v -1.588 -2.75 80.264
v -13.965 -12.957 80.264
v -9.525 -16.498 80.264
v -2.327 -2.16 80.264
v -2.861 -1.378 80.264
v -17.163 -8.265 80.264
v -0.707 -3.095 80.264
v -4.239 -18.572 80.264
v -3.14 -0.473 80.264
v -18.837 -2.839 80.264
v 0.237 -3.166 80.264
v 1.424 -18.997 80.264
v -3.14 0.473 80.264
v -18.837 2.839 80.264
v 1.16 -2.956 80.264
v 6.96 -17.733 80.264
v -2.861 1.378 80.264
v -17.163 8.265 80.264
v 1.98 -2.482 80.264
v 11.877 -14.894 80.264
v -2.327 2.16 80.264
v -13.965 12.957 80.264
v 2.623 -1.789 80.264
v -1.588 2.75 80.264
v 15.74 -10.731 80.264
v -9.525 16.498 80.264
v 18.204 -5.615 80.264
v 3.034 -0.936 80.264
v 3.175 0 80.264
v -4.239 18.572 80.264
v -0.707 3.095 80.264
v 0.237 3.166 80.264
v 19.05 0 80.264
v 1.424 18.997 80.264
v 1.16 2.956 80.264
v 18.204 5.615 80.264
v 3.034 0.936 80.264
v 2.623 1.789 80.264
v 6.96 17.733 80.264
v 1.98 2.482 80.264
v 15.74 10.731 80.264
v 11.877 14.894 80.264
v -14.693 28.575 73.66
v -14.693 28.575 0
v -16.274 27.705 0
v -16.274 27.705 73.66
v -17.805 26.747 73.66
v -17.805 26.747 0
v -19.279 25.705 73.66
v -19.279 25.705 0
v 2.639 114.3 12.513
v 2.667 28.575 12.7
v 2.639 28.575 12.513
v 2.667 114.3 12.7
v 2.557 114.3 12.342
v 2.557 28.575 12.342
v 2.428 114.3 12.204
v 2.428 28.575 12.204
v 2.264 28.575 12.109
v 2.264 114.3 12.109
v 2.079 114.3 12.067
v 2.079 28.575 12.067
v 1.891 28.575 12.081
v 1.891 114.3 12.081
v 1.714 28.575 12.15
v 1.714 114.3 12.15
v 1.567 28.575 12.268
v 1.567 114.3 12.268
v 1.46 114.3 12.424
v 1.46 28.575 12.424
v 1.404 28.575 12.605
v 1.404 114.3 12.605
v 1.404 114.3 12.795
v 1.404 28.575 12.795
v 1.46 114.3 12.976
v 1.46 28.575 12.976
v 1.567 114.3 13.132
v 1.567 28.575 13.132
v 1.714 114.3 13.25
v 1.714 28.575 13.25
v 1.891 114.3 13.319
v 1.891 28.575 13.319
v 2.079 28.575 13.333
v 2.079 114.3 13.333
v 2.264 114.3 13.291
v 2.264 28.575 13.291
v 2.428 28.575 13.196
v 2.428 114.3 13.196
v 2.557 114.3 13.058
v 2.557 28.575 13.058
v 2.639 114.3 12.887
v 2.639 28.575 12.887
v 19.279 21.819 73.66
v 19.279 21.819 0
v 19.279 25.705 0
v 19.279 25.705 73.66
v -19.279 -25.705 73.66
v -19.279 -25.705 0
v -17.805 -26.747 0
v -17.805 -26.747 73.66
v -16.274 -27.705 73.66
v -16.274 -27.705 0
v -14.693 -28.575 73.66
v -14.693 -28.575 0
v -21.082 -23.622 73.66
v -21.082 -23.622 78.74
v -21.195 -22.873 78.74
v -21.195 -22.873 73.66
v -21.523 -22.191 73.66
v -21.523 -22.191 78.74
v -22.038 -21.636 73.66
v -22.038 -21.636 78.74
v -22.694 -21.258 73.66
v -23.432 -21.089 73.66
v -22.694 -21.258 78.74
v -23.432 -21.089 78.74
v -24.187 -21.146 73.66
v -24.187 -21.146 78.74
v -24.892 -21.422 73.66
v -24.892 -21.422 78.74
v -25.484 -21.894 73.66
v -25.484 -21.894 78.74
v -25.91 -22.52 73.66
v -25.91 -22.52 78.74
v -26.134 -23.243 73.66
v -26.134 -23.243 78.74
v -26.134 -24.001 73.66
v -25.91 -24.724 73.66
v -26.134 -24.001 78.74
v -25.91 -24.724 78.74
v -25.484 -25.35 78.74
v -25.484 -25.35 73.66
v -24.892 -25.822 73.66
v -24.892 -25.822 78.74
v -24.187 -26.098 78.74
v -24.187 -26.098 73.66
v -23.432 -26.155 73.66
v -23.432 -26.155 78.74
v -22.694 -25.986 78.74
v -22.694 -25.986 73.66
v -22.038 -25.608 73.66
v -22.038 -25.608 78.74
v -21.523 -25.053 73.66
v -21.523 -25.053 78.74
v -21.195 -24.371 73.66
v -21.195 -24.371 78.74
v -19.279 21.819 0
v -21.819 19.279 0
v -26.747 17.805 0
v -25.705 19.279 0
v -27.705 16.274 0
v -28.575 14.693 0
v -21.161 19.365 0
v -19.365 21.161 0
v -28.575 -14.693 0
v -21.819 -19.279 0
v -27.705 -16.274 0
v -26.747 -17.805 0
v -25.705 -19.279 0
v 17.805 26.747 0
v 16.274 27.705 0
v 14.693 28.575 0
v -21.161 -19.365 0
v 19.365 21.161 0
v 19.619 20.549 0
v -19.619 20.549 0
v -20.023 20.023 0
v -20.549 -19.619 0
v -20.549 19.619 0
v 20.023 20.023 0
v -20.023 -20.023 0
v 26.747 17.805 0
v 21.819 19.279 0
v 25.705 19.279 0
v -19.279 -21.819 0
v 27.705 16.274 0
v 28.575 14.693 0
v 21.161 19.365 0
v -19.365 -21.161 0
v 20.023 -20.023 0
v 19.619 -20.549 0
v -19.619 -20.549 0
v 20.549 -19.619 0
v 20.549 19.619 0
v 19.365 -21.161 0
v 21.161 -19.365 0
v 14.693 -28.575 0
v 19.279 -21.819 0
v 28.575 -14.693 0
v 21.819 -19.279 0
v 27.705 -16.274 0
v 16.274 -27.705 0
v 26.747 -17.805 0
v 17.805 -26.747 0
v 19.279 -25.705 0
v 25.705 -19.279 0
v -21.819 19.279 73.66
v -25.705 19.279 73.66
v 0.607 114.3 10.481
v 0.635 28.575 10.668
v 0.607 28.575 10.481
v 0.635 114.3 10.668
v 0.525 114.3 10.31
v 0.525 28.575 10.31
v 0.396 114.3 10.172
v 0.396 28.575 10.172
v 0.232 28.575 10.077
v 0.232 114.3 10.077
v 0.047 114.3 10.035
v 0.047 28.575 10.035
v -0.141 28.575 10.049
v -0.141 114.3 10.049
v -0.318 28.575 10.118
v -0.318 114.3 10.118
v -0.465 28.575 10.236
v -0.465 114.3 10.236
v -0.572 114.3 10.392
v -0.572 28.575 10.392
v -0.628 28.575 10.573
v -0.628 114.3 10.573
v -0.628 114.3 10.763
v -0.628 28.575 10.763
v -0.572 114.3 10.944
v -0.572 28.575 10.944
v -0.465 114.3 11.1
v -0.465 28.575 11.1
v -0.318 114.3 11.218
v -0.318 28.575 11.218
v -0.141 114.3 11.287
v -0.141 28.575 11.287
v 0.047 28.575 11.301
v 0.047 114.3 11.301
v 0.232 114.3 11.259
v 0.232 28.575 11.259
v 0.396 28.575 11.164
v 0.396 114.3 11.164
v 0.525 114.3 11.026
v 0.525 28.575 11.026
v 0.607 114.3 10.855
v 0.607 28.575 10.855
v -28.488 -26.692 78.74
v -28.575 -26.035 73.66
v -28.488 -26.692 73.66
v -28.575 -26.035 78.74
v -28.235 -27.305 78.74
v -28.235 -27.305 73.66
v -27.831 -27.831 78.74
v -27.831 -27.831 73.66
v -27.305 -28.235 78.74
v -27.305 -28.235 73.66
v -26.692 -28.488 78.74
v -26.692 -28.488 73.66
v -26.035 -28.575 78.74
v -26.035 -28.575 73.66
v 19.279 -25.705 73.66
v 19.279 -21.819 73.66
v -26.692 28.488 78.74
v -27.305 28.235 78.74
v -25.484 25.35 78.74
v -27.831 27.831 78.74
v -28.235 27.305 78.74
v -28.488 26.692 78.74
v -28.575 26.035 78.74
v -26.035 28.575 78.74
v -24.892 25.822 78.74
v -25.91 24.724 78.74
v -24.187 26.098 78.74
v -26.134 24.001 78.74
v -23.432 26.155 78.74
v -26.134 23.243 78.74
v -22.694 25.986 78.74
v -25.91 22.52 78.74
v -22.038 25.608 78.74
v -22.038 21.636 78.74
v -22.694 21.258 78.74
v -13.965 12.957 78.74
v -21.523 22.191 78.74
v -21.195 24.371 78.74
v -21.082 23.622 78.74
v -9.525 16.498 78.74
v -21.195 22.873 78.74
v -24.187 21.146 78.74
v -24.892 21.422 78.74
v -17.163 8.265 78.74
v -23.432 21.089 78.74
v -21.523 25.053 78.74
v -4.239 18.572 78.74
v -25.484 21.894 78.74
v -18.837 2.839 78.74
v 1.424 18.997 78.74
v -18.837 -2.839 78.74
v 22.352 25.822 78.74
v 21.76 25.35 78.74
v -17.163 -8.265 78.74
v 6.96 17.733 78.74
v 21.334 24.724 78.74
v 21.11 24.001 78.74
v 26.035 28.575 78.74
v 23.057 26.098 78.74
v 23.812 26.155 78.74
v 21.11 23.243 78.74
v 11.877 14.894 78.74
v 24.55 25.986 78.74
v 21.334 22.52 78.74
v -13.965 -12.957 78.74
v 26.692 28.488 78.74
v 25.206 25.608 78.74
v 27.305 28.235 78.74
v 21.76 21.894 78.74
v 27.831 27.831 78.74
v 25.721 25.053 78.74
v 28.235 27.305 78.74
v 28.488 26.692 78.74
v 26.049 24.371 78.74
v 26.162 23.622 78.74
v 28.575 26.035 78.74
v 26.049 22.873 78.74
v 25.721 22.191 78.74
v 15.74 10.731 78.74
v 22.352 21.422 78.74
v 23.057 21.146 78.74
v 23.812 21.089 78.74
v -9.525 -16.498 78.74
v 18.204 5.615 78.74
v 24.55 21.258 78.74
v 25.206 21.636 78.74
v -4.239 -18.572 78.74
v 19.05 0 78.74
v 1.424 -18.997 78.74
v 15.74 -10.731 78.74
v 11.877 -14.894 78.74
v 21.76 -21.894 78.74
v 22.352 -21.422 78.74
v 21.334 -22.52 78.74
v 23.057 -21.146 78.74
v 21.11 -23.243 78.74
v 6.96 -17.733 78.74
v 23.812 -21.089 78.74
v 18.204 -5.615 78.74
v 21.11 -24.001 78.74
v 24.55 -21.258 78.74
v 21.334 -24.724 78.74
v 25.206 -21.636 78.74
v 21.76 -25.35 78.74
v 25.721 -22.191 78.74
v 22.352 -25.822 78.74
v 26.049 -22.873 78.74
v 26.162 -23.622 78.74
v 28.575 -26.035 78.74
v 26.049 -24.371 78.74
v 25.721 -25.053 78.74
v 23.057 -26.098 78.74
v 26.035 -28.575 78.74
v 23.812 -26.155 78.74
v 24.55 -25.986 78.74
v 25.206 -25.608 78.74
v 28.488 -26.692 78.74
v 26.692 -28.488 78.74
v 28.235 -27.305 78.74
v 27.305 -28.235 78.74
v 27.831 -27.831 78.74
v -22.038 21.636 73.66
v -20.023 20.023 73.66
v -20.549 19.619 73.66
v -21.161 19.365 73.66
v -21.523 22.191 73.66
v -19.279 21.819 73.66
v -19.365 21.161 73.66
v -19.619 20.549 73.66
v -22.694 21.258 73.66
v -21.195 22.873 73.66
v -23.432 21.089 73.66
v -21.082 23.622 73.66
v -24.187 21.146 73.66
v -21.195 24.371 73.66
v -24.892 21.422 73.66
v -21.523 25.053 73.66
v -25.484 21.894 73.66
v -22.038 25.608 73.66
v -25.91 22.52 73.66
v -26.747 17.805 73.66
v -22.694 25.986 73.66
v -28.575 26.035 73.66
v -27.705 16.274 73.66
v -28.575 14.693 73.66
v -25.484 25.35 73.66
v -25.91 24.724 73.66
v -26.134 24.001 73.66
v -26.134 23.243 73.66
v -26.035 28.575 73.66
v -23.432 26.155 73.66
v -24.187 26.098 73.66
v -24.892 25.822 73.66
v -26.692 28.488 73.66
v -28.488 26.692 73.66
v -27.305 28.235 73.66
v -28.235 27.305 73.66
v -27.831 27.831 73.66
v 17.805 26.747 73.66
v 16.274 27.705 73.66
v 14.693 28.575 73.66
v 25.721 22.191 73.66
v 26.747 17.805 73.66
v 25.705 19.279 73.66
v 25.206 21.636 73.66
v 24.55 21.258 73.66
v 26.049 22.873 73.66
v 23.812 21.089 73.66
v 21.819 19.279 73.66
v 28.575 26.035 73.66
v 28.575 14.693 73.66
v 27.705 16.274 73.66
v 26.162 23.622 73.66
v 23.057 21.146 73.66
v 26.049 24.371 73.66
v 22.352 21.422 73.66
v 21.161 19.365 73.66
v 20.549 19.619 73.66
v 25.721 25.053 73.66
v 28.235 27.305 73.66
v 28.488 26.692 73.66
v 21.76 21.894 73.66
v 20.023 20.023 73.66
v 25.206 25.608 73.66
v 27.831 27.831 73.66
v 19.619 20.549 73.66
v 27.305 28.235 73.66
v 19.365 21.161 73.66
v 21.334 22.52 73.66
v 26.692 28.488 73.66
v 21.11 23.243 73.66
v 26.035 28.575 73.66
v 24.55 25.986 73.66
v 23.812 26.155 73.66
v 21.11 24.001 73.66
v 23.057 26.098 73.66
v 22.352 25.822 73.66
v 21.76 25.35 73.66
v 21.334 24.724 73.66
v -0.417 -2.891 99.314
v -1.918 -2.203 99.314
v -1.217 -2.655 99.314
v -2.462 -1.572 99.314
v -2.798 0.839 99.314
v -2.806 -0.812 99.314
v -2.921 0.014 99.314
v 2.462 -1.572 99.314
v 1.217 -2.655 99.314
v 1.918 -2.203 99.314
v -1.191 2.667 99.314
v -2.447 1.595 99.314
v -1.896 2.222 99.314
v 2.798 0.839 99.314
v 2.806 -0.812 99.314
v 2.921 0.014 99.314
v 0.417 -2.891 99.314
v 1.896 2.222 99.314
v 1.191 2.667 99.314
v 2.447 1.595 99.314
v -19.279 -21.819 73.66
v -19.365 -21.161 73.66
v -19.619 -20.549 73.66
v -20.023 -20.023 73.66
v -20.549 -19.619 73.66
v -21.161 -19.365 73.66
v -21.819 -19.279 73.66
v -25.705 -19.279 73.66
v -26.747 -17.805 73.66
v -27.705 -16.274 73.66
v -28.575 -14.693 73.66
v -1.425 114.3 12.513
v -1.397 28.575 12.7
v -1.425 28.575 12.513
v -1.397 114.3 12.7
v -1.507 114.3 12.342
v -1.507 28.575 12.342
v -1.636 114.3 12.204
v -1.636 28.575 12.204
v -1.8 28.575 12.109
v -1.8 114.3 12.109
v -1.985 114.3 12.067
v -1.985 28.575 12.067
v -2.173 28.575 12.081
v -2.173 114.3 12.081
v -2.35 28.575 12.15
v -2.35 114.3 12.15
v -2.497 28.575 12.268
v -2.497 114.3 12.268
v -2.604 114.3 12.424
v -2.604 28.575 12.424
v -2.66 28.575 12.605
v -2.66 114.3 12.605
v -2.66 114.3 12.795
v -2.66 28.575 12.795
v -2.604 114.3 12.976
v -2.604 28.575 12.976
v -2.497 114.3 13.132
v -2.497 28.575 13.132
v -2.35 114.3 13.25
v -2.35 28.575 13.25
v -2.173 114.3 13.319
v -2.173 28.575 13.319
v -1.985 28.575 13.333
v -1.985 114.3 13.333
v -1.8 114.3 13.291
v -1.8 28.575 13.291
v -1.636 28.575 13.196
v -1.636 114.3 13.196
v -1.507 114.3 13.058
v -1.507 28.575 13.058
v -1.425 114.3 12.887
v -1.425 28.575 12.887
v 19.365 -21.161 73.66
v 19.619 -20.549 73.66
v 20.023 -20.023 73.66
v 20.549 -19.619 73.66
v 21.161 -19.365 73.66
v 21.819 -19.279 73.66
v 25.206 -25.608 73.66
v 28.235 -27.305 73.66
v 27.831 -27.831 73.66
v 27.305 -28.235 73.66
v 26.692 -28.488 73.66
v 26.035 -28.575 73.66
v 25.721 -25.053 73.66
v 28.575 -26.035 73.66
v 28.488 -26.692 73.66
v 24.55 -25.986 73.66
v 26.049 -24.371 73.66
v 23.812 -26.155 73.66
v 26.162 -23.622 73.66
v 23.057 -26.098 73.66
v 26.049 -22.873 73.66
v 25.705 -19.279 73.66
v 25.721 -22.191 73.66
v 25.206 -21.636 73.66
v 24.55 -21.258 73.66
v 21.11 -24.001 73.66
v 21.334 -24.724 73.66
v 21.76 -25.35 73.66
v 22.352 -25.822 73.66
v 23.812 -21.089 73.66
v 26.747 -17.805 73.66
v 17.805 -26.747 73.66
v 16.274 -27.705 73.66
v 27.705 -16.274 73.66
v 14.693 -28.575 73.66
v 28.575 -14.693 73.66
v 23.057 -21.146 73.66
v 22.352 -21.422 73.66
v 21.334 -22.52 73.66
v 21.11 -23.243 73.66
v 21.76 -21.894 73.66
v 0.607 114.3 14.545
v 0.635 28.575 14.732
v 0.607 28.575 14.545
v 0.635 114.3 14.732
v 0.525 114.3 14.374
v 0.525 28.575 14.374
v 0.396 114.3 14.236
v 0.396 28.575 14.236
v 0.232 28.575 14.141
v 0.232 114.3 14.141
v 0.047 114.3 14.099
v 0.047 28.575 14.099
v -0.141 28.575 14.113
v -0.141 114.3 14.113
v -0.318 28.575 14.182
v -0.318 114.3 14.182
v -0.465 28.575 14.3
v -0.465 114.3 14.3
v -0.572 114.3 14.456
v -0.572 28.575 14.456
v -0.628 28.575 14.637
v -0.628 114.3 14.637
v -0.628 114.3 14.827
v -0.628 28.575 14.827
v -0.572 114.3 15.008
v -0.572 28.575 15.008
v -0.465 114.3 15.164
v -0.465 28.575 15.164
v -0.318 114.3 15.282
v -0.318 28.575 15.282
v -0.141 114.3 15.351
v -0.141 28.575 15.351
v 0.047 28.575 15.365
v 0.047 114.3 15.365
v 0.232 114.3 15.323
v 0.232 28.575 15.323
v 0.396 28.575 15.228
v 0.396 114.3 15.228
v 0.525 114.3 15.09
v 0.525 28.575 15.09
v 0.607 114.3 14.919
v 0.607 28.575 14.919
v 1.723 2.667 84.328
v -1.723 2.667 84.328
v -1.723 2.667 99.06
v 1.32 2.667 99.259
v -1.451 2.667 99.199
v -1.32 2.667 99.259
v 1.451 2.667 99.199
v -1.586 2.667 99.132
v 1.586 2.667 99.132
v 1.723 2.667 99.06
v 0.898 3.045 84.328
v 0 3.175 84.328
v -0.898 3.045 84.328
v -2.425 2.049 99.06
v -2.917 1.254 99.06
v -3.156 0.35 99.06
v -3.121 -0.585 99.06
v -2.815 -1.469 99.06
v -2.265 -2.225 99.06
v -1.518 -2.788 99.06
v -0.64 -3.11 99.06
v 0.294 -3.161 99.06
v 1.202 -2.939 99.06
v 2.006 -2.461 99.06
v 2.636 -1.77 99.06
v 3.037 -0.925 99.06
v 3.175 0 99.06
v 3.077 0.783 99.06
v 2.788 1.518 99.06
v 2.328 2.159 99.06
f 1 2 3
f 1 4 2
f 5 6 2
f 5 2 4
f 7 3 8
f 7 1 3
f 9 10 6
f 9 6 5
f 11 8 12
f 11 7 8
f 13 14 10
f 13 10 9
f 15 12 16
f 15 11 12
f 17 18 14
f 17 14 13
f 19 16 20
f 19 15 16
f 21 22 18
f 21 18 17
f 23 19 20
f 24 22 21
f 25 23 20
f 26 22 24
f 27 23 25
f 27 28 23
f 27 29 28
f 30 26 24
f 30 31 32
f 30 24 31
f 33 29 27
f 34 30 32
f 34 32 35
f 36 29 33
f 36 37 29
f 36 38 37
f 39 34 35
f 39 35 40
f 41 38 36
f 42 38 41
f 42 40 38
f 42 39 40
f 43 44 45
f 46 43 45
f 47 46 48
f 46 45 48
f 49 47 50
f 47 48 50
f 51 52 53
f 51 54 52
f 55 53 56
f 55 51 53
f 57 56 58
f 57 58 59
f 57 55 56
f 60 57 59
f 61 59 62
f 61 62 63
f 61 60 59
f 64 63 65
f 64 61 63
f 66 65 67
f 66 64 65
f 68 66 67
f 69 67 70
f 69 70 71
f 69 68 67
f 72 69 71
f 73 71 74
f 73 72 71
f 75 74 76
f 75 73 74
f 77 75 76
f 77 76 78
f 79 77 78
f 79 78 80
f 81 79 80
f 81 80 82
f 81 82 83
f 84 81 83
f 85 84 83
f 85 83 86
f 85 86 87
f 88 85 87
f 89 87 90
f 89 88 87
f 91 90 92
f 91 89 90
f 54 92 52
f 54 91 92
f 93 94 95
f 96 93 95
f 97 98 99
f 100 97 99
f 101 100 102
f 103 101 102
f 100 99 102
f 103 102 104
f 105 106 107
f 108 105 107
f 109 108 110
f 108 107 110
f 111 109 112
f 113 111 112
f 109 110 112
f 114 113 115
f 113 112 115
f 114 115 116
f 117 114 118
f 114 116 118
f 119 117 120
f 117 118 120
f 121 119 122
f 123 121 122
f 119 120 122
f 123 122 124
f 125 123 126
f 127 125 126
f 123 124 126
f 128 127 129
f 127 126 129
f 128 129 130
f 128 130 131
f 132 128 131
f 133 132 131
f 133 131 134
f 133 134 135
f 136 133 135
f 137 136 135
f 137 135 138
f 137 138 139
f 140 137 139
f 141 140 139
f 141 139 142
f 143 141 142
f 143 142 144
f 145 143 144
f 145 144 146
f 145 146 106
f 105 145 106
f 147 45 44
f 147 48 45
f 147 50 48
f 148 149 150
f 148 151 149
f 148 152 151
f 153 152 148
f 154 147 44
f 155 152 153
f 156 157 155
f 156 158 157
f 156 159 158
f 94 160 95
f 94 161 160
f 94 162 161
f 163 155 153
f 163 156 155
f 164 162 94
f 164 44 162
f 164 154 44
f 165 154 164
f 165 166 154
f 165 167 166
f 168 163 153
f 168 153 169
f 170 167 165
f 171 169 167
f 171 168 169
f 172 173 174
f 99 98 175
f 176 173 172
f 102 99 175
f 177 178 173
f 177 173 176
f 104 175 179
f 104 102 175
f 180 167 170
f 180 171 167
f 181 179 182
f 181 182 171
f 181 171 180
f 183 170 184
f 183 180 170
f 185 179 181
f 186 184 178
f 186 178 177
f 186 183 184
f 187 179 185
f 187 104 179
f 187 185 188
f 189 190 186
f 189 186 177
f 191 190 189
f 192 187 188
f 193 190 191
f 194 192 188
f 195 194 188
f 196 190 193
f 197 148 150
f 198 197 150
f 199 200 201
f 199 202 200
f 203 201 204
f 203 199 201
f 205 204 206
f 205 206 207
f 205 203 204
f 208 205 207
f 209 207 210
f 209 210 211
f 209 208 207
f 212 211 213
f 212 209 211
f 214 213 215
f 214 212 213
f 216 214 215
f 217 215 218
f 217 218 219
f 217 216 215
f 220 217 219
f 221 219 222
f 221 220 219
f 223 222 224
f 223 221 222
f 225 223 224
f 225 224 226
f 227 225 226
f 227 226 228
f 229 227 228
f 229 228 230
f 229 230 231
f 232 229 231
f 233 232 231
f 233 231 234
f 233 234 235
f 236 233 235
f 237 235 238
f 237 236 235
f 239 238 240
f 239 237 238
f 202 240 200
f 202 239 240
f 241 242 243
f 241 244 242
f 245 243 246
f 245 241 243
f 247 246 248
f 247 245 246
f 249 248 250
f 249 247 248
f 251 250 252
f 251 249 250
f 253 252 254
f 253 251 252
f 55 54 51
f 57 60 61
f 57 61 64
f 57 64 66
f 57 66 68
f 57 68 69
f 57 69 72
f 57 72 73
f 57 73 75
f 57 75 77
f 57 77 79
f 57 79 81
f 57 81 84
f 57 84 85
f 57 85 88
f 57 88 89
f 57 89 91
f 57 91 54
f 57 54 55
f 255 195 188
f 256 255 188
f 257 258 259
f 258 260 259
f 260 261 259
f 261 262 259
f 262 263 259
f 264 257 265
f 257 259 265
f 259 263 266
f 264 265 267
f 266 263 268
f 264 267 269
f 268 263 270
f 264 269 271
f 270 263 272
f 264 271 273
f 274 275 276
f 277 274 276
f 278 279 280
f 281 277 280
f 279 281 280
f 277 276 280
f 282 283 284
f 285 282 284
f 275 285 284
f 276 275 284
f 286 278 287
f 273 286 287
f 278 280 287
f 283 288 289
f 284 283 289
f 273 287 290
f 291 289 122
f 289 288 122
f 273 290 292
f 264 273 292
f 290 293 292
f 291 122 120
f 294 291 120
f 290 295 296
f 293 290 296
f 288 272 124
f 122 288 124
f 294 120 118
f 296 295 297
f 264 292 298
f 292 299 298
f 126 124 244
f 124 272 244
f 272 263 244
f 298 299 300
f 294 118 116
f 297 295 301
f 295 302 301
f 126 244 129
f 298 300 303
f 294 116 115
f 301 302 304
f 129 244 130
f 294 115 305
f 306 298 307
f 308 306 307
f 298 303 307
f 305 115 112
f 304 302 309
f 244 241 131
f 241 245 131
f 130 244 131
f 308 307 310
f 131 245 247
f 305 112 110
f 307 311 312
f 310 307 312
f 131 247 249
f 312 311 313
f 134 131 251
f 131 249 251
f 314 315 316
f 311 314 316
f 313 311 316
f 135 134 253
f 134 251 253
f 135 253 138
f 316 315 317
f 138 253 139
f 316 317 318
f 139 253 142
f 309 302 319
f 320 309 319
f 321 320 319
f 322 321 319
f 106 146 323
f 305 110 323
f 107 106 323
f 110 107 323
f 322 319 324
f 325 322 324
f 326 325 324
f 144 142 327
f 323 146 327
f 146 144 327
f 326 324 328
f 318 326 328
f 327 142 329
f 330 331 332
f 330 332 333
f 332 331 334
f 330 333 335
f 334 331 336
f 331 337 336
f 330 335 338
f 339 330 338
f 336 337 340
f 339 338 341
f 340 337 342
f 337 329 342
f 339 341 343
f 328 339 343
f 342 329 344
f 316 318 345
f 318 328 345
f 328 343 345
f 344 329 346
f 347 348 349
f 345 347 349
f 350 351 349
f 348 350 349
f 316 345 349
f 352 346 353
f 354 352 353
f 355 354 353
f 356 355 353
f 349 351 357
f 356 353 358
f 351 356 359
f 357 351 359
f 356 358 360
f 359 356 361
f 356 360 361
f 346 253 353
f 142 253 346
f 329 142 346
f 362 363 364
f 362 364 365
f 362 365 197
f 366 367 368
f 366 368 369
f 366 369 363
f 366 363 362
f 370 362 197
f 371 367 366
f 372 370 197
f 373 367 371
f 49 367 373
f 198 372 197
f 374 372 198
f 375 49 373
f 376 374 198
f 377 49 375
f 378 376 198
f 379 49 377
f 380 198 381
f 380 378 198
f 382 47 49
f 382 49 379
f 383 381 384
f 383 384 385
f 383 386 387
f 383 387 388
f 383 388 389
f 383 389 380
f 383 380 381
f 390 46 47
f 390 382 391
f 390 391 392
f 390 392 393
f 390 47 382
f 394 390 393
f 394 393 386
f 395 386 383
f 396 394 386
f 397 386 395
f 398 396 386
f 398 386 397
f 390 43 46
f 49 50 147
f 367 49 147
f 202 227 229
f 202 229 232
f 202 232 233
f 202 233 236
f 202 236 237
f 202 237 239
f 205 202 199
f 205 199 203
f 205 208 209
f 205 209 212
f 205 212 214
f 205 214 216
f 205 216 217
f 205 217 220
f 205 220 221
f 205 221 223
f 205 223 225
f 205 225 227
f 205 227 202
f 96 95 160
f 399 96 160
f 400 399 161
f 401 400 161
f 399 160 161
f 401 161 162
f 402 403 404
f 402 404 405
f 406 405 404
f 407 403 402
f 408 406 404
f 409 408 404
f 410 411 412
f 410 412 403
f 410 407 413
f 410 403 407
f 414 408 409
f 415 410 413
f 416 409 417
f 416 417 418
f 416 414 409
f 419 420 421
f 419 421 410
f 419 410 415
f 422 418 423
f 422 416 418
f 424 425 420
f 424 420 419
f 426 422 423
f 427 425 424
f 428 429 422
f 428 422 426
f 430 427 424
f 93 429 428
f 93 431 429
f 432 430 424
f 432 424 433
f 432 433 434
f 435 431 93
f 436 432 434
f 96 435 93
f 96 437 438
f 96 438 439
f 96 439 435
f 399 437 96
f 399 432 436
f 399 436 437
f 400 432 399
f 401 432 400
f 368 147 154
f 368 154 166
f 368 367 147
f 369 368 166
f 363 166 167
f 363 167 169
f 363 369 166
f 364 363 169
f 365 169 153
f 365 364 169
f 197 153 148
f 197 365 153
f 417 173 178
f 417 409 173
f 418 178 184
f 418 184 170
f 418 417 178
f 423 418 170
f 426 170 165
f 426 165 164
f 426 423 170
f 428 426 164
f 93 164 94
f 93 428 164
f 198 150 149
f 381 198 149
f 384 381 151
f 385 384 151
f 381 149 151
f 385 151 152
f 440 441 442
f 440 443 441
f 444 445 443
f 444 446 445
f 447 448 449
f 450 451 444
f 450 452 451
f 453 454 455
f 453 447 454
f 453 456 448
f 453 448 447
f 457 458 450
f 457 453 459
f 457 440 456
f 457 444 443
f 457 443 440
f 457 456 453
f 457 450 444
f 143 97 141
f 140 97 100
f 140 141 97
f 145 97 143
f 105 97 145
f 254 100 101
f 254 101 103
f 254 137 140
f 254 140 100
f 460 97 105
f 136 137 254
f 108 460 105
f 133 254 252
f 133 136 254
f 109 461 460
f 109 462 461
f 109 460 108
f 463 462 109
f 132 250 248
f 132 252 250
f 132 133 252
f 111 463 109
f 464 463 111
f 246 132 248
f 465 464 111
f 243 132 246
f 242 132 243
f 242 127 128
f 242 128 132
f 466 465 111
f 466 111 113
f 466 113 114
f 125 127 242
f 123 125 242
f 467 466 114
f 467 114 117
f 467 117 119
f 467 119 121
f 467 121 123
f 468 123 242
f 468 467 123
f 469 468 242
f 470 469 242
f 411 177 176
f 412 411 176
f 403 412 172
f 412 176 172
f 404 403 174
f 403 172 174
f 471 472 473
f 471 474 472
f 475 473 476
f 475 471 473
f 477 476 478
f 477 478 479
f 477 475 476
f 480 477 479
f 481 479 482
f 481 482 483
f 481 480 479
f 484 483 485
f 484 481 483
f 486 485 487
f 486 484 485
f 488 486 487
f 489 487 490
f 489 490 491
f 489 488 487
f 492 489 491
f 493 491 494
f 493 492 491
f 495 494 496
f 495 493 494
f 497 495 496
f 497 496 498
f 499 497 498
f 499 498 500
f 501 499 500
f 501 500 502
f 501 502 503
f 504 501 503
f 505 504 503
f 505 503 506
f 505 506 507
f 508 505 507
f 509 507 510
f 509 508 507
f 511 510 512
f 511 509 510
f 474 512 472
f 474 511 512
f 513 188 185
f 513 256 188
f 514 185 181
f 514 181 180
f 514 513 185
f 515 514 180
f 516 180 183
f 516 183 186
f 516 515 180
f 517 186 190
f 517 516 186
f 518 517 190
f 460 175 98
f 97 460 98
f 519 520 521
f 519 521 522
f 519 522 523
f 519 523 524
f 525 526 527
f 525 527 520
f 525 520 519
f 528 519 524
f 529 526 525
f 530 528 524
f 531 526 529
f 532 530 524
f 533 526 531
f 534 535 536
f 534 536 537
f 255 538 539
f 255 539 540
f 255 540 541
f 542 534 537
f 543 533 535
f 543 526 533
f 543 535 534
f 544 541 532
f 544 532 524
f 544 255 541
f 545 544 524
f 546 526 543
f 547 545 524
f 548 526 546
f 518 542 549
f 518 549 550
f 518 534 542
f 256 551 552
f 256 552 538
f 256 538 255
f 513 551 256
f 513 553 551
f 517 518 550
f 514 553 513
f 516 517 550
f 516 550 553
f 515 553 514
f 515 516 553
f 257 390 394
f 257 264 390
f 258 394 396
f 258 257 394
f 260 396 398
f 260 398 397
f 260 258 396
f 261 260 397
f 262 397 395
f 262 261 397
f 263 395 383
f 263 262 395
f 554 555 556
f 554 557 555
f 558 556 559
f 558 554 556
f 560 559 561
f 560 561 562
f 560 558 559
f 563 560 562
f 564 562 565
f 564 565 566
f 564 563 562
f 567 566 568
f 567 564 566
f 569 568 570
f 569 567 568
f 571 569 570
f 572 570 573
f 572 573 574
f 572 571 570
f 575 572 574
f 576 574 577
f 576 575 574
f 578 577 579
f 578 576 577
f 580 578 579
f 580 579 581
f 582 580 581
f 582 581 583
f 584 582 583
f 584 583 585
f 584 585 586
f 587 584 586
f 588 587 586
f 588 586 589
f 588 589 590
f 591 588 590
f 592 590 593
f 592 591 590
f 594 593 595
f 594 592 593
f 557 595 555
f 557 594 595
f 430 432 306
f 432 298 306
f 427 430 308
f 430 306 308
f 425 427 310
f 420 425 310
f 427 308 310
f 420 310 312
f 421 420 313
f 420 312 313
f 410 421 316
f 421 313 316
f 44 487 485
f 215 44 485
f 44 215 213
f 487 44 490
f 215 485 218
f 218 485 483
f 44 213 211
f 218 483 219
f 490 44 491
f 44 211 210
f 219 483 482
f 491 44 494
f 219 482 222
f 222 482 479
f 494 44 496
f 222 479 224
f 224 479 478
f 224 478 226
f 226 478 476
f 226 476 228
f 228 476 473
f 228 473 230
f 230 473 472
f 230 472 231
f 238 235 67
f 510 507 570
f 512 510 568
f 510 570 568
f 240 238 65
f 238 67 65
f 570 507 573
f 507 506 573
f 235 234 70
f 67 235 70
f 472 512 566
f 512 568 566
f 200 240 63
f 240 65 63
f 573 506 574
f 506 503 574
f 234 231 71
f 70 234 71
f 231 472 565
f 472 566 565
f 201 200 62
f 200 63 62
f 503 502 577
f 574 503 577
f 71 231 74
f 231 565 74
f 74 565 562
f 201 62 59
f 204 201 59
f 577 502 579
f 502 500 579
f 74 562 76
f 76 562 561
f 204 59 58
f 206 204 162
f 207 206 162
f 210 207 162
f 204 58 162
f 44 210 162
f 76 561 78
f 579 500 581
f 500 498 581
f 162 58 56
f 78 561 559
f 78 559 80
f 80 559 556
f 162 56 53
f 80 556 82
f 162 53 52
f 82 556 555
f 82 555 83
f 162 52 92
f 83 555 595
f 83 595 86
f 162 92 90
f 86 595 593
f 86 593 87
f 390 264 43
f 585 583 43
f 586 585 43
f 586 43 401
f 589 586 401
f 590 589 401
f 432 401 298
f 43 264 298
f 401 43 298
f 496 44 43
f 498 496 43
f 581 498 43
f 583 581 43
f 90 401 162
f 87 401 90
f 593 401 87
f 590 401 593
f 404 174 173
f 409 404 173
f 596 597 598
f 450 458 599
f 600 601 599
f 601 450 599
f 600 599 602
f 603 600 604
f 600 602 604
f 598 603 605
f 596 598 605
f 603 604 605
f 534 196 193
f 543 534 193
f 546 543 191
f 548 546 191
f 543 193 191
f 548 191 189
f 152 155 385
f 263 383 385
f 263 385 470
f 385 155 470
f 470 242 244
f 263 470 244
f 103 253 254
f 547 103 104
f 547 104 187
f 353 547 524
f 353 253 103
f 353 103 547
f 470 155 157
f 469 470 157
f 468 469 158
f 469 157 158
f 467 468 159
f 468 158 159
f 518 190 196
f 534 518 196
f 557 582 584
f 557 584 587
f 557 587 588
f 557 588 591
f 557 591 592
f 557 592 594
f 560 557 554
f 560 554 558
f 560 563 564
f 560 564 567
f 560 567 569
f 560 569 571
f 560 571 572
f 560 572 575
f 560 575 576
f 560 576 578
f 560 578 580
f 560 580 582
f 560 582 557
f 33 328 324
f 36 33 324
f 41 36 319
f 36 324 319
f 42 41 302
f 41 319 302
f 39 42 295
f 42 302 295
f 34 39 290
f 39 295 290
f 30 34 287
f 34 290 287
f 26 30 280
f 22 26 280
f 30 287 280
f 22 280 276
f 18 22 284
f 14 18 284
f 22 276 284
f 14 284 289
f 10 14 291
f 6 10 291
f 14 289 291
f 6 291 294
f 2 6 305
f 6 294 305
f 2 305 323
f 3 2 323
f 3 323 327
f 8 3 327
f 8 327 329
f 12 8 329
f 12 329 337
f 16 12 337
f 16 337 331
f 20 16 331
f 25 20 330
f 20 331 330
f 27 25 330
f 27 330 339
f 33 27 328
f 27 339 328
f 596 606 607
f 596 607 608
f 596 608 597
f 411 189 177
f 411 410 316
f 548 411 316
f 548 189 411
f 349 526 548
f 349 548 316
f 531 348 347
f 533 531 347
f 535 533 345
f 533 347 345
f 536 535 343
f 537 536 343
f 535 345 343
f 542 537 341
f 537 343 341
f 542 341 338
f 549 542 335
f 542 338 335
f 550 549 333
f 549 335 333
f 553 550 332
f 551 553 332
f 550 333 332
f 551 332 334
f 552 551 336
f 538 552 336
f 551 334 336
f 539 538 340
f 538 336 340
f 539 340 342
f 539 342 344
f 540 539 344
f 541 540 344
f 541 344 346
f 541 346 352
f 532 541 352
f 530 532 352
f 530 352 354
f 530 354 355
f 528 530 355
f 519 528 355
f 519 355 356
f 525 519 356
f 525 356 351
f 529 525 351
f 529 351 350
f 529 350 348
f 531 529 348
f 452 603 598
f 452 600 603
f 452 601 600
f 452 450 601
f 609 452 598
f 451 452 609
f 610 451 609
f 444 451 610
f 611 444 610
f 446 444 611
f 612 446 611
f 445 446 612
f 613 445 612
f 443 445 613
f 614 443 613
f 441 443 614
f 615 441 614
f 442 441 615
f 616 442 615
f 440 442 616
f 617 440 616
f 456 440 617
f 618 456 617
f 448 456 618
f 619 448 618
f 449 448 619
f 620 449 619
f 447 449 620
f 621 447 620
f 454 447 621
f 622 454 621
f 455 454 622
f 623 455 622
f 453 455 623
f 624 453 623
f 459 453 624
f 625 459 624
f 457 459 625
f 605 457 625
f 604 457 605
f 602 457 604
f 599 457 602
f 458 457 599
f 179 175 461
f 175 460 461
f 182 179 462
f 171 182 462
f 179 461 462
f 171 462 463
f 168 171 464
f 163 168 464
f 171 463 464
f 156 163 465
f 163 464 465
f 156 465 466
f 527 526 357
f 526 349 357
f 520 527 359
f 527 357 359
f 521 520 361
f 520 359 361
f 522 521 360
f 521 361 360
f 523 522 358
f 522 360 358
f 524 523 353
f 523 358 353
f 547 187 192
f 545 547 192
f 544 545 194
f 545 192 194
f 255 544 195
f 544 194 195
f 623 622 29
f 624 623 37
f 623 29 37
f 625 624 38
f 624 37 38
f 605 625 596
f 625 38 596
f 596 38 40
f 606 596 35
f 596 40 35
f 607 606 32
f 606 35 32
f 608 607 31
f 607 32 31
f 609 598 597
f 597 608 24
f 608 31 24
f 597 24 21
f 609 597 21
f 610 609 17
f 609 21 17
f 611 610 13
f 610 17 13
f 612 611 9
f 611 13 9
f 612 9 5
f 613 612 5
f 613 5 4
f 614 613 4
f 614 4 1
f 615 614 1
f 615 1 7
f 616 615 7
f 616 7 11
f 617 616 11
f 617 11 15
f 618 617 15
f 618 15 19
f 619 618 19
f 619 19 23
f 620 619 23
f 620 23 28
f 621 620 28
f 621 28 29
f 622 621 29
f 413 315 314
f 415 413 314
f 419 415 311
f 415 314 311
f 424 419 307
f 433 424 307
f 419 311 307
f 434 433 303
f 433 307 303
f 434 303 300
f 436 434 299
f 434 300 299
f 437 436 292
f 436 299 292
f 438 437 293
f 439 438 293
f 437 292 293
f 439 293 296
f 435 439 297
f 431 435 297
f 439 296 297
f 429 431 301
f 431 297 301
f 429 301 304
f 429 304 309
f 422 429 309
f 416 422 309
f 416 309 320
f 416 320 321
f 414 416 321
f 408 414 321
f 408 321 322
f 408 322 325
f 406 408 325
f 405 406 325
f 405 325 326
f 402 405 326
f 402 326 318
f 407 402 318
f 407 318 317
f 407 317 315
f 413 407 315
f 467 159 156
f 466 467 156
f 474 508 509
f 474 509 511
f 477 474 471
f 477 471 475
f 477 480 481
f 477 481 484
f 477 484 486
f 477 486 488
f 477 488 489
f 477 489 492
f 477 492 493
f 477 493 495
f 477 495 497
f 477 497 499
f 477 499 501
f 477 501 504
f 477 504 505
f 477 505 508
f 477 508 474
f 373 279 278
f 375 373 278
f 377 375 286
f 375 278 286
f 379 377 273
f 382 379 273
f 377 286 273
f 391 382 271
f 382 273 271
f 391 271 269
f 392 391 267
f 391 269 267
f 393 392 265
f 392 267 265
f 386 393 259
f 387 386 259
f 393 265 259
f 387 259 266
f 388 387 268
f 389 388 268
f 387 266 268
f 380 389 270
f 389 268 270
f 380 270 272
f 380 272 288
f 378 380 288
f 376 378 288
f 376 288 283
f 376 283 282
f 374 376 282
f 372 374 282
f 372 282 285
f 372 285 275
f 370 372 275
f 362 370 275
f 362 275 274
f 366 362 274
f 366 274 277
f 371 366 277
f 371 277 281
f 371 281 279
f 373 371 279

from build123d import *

# Parameters (mm, degrees)
SKETCH1_W           = 57.15
SKETCH1_H           = 78.74
BOSS_EXTRUDE1_DEPTH = 57.15
CUT_EXTRUDE1_DEPTH  = 73.66
CUT_EXTRUDE2_DEPTH  = 73.66
CUT_EXTRUDE3_DEPTH  = 73.66
CUT_EXTRUDE4_DEPTH  = 73.66
CUT_EXTRUDE5_DEPTH  = 73.66
CUT_EXTRUDE6_DEPTH  = 73.66
CUT_EXTRUDE7_DEPTH  = 73.66
CUT_EXTRUDE8_DEPTH  = 73.66
SKETCH10_R          = 19.05
BOSS_EXTRUDE2_DEPTH = 1.524
SKETCH11_R          = 3.175
BOSS_EXTRUDE3_DEPTH = 19.05
CUT_EXTRUDE9_DEPTH  = 14.986
SKETCH13_W          = 0.635
SKETCH13_H          = 85.725
SKETCH14_W          = 0.635
SKETCH14_H          = 85.725
SKETCH15_W          = 0.635
SKETCH15_H          = 85.725
SKETCH16_W          = 0.635
SKETCH16_H          = 85.725
HOLE1_D             = 5.08
HOLE1_DEPTH         = 25.654
HOLE2_D             = 5.08
HOLE2_DEPTH         = 25.654
HOLE3_D             = 5.08
HOLE3_DEPTH         = 25.654
HOLE4_D             = 5.08
HOLE4_DEPTH         = 25.654
CHAMFER1_SIZE       = 0.254
FILLET1_R           = 2.54
FILLET2_R           = 2.54
FILLET3_R           = 2.54
FILLET4_R           = 2.54
FILLET5_R           = 2.54
FILLET6_R           = 2.54
FILLET7_R           = 2.54
FILLET8_R           = 2.54


with BuildPart() as part:
    # Sketch1 → Boss-Extrude1 (new body)
    with BuildSketch(Plane.XZ.offset(28.575)):
        with Locations((0, 39.37)):
            Rectangle(SKETCH1_W, SKETCH1_H)
    extrude(amount=-BOSS_EXTRUDE1_DEPTH)

    # Sketch2 → Cut-Extrude1 (cut)
    with BuildSketch(Plane(origin=(0, 0, 0), x_dir=(-1, 0, 0), z_dir=(0, 0, -1))):
        with BuildLine():
            Line((-28.575, -28.575), (-14.692533342, -28.575))
            ThreePointArc((-14.692533342, -28.575), (-22.720047986, -22.720047986), (-28.575, -14.692533342))
            Line((-28.575, -14.692533342), (-28.575, -28.575))
        make_face()
    extrude(amount=-CUT_EXTRUDE1_DEPTH, mode=Mode.SUBTRACT)

    # Sketch3 → Cut-Extrude2 (cut)
    with BuildSketch(Plane(origin=(0, 0, 0), x_dir=(-1, 0, 0), z_dir=(0, 0, -1))):
        with BuildLine():
            Line((-19.2786, -25.7048), (-19.2786, -19.2786))
            Line((-19.2786, -19.2786), (-25.7048, -19.2786))
            ThreePointArc((-25.7048, -19.2786), (-22.720047986, -22.720047986), (-19.2786, -25.7048))
        make_face()
    extrude(amount=-CUT_EXTRUDE2_DEPTH, mode=Mode.SUBTRACT)

    # Sketch4 → Cut-Extrude3 (cut)
    with BuildSketch(Plane(origin=(0, 0, 0), x_dir=(-1, 0, 0), z_dir=(0, 0, -1))):
        with BuildLine():
            Line((-28.575, 28.575), (-28.575, 14.692533342))
            ThreePointArc((-28.575, 14.692533342), (-22.720047986, 22.720047986), (-14.692533342, 28.575))
            Line((-14.692533342, 28.575), (-28.575, 28.575))
        make_face()
    extrude(amount=-CUT_EXTRUDE3_DEPTH, mode=Mode.SUBTRACT)

    # Sketch5 → Cut-Extrude4 (cut)
    with BuildSketch(Plane(origin=(0, 0, 0), x_dir=(-1, 0, 0), z_dir=(0, 0, -1))):
        with BuildLine():
            Line((-25.7048, 19.2786), (-19.2786, 19.2786))
            Line((-19.2786, 19.2786), (-19.2786, 25.7048))
            ThreePointArc((-19.2786, 25.7048), (-22.720047986, 22.720047986), (-25.7048, 19.2786))
        make_face()
    extrude(amount=-CUT_EXTRUDE4_DEPTH, mode=Mode.SUBTRACT)

    # Sketch6 → Cut-Extrude5 (cut)
    with BuildSketch(Plane(origin=(0, 0, 0), x_dir=(-1, 0, 0), z_dir=(0, 0, -1))):
        with BuildLine():
            Line((28.575, 28.575), (14.692533342, 28.575))
            ThreePointArc((14.692533342, 28.575), (22.720047986, 22.720047986), (28.575, 14.692533342))
            Line((28.575, 14.692533342), (28.575, 28.575))
        make_face()
    extrude(amount=-CUT_EXTRUDE5_DEPTH, mode=Mode.SUBTRACT)

    # Sketch7 → Cut-Extrude6 (cut)
    with BuildSketch(Plane(origin=(0, 0, 0), x_dir=(-1, 0, 0), z_dir=(0, 0, -1))):
        with BuildLine():
            Line((19.2786, 25.7048), (19.2786, 19.2786))
            Line((19.2786, 19.2786), (25.7048, 19.2786))
            ThreePointArc((25.7048, 19.2786), (22.720047986, 22.720047986), (19.2786, 25.7048))
        make_face()
    extrude(amount=-CUT_EXTRUDE6_DEPTH, mode=Mode.SUBTRACT)

    # Sketch8 → Cut-Extrude7 (cut)
    with BuildSketch(Plane(origin=(0, 0, 0), x_dir=(-1, 0, 0), z_dir=(0, 0, -1))):
        with BuildLine():
            Line((28.575, -28.575), (28.575, -14.692533342))
            ThreePointArc((28.575, -14.692533342), (22.720047986, -22.720047986), (14.692533342, -28.575))
            Line((14.692533342, -28.575), (28.575, -28.575))
        make_face()
    extrude(amount=-CUT_EXTRUDE7_DEPTH, mode=Mode.SUBTRACT)

    # Sketch9 → Cut-Extrude8 (cut)
    with BuildSketch(Plane(origin=(0, 0, 0), x_dir=(-1, 0, 0), z_dir=(0, 0, -1))):
        with BuildLine():
            Line((25.7048, -19.2786), (19.2786, -19.2786))
            Line((19.2786, -19.2786), (19.2786, -25.7048))
            ThreePointArc((19.2786, -25.7048), (22.720047986, -22.720047986), (25.7048, -19.2786))
        make_face()
    extrude(amount=-CUT_EXTRUDE8_DEPTH, mode=Mode.SUBTRACT)

    # Sketch10 → Boss-Extrude2 (add)
    with BuildSketch(Plane.XY.offset(78.74)):
        Circle(SKETCH10_R)
    extrude(amount=BOSS_EXTRUDE2_DEPTH)

    # Sketch11 → Boss-Extrude3 (add)
    with BuildSketch(Plane.XY.offset(80.264)):
        Circle(SKETCH11_R)
    extrude(amount=BOSS_EXTRUDE3_DEPTH)

    # Sketch12 → Cut-Extrude9 (cut)
    with BuildSketch(Plane.XY.offset(99.314)):
        with BuildLine():
            Line((-1.722711816, 2.667), (1.722711816, 2.667))
            ThreePointArc((1.722711816, 2.667), (0, 3.175), (-1.722711816, 2.667))
        make_face()
    extrude(amount=-CUT_EXTRUDE9_DEPTH, mode=Mode.SUBTRACT)

    # Sketch13 → Revolve1 (revolve)
    with BuildSketch(Plane(origin=(0, 0, 12.7), x_dir=(-1, 0, 0), z_dir=(0, 0, -1))):
        with Locations((1.7145, 71.4375)):
            Rectangle(SKETCH13_W, SKETCH13_H)
    revolve(axis=Axis((-2.032, 28.575, 12.7), (0, 1, 0)))

    # Sketch14 → Revolve2 (revolve)
    with BuildSketch(Plane(origin=(0, 0, 12.7), x_dir=(-1, 0, 0), z_dir=(0, 0, -1))):
        with Locations((-2.3495, 71.4375)):
            Rectangle(SKETCH14_W, SKETCH14_H)
    revolve(axis=Axis((2.032, 28.575, 12.7), (0, 1, 0)))

    # Sketch15 → Revolve3 (revolve)
    with BuildSketch(Plane(origin=(0, 0, 14.732), x_dir=(-1, 0, 0), z_dir=(0, 0, -1))):
        with Locations((-0.3175, 71.4375)):
            Rectangle(SKETCH15_W, SKETCH15_H)
    revolve(axis=Axis((0, 28.575, 14.732), (0, 1, 0)))

    # Sketch16 → Revolve4 (revolve)
    with BuildSketch(Plane(origin=(0, 0, 10.668), x_dir=(-1, 0, 0), z_dir=(0, 0, -1))):
        with Locations((-0.3175, 71.4375)):
            Rectangle(SKETCH16_W, SKETCH16_H)
    revolve(axis=Axis((0, 28.575, 10.668), (0, 1, 0)))

    # Hole1
    with Locations(Plane(origin=(0, 0, 73.66), x_dir=(-1, 0, 0), z_dir=(0, 0, -1))):
        with Locations((23.622, -23.622)):
            Hole(HOLE1_D / 2, depth=HOLE1_DEPTH)

    # Hole2
    with Locations(Plane(origin=(0, 0, 73.66), x_dir=(-1, 0, 0), z_dir=(0, 0, -1))):
        with Locations((23.622, 23.622)):
            Hole(HOLE2_D / 2, depth=HOLE2_DEPTH)

    # Hole3
    with Locations(Plane(origin=(0, 0, 73.66), x_dir=(-1, 0, 0), z_dir=(0, 0, -1))):
        with Locations((-23.622, 23.622)):
            Hole(HOLE3_D / 2, depth=HOLE3_DEPTH)

    # Hole4
    with Locations(Plane(origin=(0, 0, 73.66), x_dir=(-1, 0, 0), z_dir=(0, 0, -1))):
        with Locations((-23.622, -23.622)):
            Hole(HOLE4_D / 2, depth=HOLE4_DEPTH)

    # Chamfer1
    chamfer1_edges = [part.edges().sort_by_distance(p)[0] for p in [
        (-1.51838977, -2.78838977, 99.314),
    ]]
    chamfer(chamfer1_edges, length=CHAMFER1_SIZE)

    # Fillet1
    fillet1_edges = [part.edges().sort_by_distance(p)[0] for p in [
        (-28.575, 28.575, 76.2),
    ]]
    fillet(fillet1_edges, radius=FILLET1_R)

    # Fillet2
    fillet2_edges = [part.edges().sort_by_distance(p)[0] for p in [
        (-28.575, -28.575, 76.2),
    ]]
    fillet(fillet2_edges, radius=FILLET2_R)

    # Fillet3
    fillet3_edges = [part.edges().sort_by_distance(p)[0] for p in [
        (28.575, 28.575, 76.2),
    ]]
    fillet(fillet3_edges, radius=FILLET3_R)

    # Fillet4
    fillet4_edges = [part.edges().sort_by_distance(p)[0] for p in [
        (-19.2786, 19.2786, 36.83),
    ]]
    fillet(fillet4_edges, radius=FILLET4_R)

    # Fillet5
    fillet5_edges = [part.edges().sort_by_distance(p)[0] for p in [
        (28.575, -28.575, 76.2),
    ]]
    fillet(fillet5_edges, radius=FILLET5_R)

    # Fillet6
    fillet6_edges = [part.edges().sort_by_distance(p)[0] for p in [
        (19.2786, -19.2786, 36.83),
    ]]
    fillet(fillet6_edges, radius=FILLET6_R)

    # Fillet7
    fillet7_edges = [part.edges().sort_by_distance(p)[0] for p in [
        (19.2786, 19.2786, 36.83),
    ]]
    fillet(fillet7_edges, radius=FILLET7_R)

    # Fillet8
    fillet8_edges = [part.edges().sort_by_distance(p)[0] for p in [
        (-19.2786, -19.2786, 36.83),
    ]]
    fillet(fillet8_edges, radius=FILLET8_R)


solid = part.part
